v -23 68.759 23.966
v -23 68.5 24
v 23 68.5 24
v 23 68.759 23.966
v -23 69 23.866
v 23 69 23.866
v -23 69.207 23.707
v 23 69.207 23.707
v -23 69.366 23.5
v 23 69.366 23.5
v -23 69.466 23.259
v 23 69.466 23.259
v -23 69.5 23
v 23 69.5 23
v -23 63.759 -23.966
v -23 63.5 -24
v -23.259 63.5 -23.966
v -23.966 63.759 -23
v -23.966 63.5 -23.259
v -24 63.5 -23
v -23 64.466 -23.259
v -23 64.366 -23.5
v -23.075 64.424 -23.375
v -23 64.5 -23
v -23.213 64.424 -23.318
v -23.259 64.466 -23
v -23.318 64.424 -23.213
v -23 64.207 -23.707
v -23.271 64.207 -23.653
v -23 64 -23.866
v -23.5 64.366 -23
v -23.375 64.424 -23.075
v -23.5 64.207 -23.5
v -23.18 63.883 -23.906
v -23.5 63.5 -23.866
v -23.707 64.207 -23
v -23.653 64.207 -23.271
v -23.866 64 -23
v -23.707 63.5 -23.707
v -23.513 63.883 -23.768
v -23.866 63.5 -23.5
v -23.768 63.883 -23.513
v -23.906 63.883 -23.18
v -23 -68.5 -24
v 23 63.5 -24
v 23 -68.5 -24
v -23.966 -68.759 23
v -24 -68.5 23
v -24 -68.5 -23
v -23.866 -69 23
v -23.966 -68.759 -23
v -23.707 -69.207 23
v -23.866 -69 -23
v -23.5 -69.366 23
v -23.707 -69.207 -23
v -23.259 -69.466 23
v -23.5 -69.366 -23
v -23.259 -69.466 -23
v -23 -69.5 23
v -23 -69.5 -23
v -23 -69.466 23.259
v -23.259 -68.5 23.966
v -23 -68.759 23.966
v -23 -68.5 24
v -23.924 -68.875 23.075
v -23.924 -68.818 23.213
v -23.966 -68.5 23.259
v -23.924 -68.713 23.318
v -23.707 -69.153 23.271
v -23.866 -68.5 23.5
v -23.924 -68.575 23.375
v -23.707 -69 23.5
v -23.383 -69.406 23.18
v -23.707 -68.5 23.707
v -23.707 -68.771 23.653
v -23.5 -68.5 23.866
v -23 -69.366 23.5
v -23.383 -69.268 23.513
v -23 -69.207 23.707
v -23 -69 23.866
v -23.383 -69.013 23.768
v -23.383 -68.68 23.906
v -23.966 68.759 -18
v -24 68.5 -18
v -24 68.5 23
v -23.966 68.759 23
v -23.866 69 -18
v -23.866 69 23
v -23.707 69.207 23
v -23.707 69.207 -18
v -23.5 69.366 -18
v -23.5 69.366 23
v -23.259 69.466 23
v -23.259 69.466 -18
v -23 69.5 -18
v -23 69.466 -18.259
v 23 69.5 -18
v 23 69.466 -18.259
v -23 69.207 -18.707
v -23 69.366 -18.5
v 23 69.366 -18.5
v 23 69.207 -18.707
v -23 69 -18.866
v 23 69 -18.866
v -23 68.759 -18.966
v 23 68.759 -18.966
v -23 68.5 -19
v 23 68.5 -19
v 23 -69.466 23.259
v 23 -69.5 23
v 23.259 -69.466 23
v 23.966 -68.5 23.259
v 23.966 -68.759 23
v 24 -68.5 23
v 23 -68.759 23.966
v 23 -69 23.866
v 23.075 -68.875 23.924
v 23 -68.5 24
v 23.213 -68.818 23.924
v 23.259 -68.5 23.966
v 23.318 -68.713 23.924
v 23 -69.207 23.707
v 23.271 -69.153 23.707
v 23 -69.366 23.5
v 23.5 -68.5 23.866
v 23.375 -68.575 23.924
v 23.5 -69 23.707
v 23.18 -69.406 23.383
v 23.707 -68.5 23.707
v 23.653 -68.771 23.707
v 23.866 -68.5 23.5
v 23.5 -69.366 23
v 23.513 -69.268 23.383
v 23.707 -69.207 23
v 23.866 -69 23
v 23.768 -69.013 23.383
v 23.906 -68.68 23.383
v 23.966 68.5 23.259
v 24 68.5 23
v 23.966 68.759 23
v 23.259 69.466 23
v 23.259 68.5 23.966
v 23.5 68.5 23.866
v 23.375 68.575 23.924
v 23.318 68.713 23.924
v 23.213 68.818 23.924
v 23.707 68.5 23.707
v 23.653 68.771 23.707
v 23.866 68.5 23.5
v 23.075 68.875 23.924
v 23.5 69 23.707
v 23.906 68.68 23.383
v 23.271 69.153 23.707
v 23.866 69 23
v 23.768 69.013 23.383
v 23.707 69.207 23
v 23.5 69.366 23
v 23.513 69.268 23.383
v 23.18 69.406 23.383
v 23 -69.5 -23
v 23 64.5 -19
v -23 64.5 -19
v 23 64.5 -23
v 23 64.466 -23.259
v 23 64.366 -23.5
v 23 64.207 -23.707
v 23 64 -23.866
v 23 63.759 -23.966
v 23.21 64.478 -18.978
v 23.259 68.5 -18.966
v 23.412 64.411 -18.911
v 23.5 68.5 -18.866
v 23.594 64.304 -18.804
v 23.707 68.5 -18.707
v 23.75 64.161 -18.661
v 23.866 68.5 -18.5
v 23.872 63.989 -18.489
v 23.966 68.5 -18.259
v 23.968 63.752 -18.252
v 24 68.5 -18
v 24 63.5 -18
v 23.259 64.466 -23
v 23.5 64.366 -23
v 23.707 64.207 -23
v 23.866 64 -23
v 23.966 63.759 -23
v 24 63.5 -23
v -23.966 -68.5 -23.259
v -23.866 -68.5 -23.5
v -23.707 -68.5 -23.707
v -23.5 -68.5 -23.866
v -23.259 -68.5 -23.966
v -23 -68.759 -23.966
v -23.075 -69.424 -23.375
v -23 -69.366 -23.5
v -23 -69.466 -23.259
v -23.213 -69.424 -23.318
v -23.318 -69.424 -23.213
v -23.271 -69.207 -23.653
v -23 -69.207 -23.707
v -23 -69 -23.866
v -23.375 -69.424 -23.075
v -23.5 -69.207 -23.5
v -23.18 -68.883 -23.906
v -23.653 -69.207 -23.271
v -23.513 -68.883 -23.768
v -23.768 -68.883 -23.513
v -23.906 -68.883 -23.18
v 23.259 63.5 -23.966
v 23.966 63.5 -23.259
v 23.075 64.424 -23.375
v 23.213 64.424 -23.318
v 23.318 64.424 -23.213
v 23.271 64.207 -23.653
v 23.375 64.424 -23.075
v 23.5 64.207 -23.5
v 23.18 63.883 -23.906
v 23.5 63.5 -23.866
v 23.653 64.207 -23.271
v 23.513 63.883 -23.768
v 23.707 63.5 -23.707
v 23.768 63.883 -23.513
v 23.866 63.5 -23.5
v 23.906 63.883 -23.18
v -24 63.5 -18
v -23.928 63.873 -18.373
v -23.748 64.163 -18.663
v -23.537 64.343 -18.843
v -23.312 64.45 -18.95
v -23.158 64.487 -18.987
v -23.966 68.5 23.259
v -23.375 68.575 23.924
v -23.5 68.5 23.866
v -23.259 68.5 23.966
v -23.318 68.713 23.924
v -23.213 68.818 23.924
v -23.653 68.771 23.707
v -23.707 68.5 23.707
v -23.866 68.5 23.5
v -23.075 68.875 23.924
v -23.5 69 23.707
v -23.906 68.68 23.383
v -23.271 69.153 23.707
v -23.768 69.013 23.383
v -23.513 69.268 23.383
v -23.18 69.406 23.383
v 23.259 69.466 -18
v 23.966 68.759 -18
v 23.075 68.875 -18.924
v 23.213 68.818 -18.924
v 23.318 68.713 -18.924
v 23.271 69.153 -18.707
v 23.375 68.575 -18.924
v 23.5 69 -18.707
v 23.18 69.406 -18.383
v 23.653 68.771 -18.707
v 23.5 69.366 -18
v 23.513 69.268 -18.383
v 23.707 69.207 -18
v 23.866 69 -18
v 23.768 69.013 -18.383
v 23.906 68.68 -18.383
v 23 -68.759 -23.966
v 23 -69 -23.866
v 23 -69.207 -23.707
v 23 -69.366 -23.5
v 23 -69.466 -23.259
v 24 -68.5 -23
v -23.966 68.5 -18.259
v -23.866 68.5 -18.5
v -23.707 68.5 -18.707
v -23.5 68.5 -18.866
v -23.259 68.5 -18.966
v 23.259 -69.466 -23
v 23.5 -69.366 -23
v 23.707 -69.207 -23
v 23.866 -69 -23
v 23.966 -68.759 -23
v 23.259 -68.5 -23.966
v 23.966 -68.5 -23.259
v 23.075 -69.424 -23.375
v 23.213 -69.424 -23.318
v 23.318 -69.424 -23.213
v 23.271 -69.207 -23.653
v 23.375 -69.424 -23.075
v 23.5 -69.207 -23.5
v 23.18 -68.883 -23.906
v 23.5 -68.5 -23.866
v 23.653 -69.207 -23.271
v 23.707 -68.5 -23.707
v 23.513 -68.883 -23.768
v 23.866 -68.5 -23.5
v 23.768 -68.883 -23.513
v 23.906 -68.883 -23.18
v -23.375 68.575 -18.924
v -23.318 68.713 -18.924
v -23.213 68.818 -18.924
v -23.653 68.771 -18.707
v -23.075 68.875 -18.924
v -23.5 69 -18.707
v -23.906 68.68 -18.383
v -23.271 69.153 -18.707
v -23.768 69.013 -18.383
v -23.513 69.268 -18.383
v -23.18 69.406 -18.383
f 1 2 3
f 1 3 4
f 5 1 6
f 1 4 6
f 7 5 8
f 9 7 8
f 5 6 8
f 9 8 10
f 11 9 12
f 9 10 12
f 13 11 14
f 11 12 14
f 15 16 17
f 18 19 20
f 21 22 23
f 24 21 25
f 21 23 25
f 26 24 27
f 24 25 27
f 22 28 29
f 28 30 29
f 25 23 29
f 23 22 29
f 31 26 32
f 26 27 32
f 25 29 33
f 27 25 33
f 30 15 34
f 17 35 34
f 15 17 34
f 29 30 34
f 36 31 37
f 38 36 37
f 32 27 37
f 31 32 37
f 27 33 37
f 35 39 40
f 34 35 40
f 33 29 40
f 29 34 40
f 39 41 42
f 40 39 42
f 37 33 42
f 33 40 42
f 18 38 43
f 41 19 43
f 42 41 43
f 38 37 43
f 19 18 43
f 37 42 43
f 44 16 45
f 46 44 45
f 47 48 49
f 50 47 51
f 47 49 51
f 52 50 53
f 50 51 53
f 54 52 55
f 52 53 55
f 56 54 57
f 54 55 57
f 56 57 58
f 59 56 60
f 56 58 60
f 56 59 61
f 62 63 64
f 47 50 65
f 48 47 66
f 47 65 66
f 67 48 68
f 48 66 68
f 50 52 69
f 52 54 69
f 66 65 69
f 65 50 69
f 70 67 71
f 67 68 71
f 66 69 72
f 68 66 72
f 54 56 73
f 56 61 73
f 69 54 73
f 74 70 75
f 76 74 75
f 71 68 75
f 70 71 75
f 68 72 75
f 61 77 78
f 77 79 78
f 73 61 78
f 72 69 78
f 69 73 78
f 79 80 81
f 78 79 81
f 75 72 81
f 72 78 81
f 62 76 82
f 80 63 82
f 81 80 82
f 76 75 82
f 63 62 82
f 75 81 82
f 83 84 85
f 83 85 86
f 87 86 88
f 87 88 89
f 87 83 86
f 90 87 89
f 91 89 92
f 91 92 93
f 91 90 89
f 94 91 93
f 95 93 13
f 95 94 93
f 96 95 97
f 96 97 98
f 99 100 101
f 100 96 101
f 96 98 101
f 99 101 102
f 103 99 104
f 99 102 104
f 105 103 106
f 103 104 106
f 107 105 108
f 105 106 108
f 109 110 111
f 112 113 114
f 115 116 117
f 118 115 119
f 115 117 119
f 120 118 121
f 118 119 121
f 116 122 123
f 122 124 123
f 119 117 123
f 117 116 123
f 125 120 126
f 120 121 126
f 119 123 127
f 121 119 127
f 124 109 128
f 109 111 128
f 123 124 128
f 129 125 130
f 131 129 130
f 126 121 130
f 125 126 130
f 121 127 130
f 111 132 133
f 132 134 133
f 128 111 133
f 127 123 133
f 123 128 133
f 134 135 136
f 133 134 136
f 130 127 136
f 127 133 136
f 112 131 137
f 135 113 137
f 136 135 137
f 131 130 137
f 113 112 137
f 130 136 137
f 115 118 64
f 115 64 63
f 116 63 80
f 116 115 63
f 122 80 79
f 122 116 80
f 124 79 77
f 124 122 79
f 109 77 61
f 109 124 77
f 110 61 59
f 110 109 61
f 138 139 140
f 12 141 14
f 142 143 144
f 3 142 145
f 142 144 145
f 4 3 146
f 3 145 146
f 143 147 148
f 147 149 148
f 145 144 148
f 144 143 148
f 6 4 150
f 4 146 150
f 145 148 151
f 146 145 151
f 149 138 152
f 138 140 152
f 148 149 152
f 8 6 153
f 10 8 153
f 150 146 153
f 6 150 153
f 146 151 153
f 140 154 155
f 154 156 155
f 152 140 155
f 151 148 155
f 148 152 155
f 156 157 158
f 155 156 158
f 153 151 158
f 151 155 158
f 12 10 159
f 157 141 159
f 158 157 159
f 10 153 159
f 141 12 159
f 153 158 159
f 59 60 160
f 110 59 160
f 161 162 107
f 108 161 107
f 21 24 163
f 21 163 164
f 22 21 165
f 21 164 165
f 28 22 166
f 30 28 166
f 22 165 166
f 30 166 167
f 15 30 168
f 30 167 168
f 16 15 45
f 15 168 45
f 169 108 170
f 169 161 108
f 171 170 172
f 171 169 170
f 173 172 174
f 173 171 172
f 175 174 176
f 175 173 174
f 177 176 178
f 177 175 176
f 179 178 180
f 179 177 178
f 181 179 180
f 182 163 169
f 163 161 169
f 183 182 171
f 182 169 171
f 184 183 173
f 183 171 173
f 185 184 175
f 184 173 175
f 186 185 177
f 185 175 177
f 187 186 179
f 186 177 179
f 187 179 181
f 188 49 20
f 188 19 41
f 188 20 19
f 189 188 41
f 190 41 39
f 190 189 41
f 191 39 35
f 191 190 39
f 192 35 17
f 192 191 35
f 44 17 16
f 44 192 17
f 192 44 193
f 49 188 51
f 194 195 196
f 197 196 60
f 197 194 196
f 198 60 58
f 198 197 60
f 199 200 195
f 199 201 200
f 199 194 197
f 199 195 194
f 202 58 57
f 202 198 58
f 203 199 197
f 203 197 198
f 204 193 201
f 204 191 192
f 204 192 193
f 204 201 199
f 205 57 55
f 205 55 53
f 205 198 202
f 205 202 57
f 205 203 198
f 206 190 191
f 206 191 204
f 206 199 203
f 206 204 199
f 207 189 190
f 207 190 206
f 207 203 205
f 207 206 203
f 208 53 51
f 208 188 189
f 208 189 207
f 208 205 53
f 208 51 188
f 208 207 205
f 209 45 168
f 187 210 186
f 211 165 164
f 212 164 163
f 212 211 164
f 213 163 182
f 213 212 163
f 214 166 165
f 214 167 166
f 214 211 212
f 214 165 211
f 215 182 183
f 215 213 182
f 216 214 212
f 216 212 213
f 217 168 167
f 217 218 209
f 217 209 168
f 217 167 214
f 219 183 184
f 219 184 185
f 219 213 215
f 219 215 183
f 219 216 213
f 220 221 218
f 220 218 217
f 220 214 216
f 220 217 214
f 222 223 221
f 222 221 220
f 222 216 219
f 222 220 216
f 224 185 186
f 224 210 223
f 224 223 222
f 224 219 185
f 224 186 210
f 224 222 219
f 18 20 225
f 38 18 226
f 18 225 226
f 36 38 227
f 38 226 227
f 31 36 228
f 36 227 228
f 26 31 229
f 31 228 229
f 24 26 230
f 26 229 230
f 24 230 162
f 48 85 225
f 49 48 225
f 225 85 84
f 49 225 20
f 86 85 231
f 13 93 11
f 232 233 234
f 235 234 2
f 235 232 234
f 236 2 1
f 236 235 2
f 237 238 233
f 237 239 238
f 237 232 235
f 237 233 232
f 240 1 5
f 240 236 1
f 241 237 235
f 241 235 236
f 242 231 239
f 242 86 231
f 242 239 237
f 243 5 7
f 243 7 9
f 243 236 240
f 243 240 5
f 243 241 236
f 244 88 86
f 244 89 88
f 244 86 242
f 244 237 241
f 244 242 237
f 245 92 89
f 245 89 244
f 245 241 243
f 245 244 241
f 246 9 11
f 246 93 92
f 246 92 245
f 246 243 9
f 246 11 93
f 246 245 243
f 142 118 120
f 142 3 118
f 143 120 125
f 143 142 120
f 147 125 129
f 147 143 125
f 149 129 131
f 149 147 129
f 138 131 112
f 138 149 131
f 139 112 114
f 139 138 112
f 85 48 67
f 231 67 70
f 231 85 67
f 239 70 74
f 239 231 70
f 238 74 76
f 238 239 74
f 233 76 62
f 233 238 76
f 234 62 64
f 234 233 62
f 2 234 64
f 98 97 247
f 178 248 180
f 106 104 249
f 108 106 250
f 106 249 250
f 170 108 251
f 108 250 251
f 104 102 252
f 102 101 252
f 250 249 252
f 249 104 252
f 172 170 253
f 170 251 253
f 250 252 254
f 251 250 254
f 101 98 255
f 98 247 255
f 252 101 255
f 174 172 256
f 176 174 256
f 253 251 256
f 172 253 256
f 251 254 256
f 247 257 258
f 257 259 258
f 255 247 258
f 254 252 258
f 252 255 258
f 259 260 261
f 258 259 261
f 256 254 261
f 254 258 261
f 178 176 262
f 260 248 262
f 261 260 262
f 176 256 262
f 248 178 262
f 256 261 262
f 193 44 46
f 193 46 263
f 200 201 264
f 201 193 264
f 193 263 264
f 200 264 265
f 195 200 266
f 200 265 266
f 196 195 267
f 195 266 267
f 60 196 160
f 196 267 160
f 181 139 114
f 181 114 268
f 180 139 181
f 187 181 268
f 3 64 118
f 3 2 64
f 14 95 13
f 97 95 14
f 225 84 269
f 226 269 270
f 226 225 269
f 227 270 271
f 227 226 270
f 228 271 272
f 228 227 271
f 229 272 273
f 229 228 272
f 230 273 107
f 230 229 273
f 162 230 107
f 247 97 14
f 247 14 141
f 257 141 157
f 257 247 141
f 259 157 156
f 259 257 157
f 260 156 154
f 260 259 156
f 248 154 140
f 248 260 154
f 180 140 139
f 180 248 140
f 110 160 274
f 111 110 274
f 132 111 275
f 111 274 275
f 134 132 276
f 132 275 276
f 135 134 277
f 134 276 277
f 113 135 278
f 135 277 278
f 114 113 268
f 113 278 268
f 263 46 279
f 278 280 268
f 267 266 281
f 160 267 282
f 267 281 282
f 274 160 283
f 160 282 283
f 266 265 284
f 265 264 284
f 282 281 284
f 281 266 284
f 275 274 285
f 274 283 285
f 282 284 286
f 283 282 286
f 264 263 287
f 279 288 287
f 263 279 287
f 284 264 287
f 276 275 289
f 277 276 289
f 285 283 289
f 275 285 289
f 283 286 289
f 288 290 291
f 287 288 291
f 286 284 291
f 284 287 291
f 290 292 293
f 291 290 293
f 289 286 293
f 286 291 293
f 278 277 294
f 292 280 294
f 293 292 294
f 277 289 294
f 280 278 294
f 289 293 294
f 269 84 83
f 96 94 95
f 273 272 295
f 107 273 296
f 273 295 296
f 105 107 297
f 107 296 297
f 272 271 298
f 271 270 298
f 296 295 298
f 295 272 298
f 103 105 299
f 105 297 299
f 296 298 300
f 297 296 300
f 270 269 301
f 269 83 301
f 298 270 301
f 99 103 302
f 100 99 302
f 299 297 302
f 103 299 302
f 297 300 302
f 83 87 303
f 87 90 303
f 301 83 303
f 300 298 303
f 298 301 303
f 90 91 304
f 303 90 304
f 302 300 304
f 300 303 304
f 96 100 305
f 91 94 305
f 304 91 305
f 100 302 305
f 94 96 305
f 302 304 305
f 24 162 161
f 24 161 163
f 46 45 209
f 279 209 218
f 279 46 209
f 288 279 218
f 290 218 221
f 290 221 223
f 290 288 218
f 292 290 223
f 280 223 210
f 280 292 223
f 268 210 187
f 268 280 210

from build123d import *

# Parameters (mm, degrees)
SKETCH1_W               = 48
SKETCH1_H               = 48
BOSS_EXTRUDE1_DEPTH     = 69.5
CUT_EXTRUDE1_DEPTH      = 78.345006303
CUT_EXTRUDE1_DEPTH_BACK = 78.345006303
SKETCH2_W               = 5
SKETCH2_H               = 5
FILLET1_R               = 1


with BuildPart() as part:
    # Sketch1 → Boss-Extrude1 (new, symmetric)
    with BuildSketch(Plane(origin=(0, 0, 0), x_dir=(1, 0, 0), z_dir=(0, 1, 0))):
        Rectangle(SKETCH1_W, SKETCH1_H)
    extrude(amount=BOSS_EXTRUDE1_DEPTH, both=True)

    # Sketch2 → Cut-Extrude1 (cut, two sides: drawn at the far end of the back side and taken through both)
    with BuildSketch(Plane(origin=(0, 0, 0), x_dir=(0, 0, -1), z_dir=(1, 0, 0)).offset(-CUT_EXTRUDE1_DEPTH_BACK)):
        with Locations((21.5, 67)):
            Rectangle(SKETCH2_W, SKETCH2_H)
    extrude(amount=CUT_EXTRUDE1_DEPTH + CUT_EXTRUDE1_DEPTH_BACK, mode=Mode.SUBTRACT)

    # Fillet1
    fillet1_edges = [part.edges().sort_by_distance(p)[0] for p in [
        (24, 69.5, 2.5),
        (-24, 69.5, 2.5),
        (-24, -2.5, -24),
        (24, -2.5, -24),
        (0, 64.5, -24),
        (-24, 64.5, -21.5),
        (-24, 67, -19),
        (0, 69.5, -19),
        (24, 67, -19),
        (24, 64.5, -21.5),
        (0, -69.5, -24),
        (24, -69.5, 0),
        (0, -69.5, 24),
        (-24, -69.5, 0),
        (24, 0, 24),
        (-24, 0, 24),
        (0, 69.5, 24),
    ]]
    fillet(fillet1_edges, radius=FILLET1_R)


solid = part.part
